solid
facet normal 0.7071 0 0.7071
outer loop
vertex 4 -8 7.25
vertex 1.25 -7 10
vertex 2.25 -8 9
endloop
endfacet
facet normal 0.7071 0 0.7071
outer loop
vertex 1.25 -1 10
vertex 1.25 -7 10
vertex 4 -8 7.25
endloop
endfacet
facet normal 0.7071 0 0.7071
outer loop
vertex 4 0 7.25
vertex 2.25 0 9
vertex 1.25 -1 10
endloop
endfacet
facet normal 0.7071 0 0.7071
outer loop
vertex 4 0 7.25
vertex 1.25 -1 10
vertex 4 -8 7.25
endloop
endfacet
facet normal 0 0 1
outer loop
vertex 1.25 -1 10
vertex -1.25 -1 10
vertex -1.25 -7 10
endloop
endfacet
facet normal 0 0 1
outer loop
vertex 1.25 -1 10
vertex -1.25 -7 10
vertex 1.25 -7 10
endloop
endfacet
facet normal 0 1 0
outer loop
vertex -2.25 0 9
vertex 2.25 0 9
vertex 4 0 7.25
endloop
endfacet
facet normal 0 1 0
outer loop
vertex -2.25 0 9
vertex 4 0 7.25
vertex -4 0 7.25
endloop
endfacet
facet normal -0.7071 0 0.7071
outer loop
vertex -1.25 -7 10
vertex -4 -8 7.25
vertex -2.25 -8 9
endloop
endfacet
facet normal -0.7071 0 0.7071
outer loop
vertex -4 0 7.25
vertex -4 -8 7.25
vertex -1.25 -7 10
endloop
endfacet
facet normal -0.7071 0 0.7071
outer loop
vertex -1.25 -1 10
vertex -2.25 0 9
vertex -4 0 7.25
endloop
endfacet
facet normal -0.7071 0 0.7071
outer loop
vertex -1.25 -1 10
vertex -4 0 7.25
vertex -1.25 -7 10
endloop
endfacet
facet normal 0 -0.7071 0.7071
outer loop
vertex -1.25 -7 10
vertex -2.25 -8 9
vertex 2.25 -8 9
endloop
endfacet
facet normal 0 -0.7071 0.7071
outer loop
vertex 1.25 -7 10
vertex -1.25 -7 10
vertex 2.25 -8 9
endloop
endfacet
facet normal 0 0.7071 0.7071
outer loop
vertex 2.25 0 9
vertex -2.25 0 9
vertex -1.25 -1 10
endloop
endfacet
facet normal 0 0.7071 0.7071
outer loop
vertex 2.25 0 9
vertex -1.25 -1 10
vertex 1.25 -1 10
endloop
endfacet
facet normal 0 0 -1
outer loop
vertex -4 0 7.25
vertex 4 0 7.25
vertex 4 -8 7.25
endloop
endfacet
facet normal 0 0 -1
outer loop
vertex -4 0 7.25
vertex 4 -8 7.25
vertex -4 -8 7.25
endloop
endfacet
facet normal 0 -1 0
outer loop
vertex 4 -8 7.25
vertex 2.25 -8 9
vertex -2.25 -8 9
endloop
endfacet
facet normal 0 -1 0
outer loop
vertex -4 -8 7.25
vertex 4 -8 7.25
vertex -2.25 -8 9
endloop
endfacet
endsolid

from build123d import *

# Parameters (mm, degrees)
EXTRUDE_DEPTH   = 8
CHAMFER_SIZE    = 1
CHAMFER001_SIZE = 1


with BuildPart() as part:
    # Sketch → Extrude (new body)
    with BuildSketch(Plane.XZ):
        Polygon((-1.25, 10), (1.25, 10), (4, 7.25), (-4, 7.25), align=None)
    extrude(amount=EXTRUDE_DEPTH)

    # Chamfer
    chamfer_edges = [part.edges().sort_by_distance(p)[0] for p in [
        (0, 0, 10),
    ]]
    chamfer(chamfer_edges, length=CHAMFER_SIZE)

    # Chamfer001
    chamfer001_edges = [part.edges().sort_by_distance(p)[0] for p in [
        (0, -8, 10),
    ]]
    chamfer(chamfer001_edges, length=CHAMFER001_SIZE)


solid = part.part
